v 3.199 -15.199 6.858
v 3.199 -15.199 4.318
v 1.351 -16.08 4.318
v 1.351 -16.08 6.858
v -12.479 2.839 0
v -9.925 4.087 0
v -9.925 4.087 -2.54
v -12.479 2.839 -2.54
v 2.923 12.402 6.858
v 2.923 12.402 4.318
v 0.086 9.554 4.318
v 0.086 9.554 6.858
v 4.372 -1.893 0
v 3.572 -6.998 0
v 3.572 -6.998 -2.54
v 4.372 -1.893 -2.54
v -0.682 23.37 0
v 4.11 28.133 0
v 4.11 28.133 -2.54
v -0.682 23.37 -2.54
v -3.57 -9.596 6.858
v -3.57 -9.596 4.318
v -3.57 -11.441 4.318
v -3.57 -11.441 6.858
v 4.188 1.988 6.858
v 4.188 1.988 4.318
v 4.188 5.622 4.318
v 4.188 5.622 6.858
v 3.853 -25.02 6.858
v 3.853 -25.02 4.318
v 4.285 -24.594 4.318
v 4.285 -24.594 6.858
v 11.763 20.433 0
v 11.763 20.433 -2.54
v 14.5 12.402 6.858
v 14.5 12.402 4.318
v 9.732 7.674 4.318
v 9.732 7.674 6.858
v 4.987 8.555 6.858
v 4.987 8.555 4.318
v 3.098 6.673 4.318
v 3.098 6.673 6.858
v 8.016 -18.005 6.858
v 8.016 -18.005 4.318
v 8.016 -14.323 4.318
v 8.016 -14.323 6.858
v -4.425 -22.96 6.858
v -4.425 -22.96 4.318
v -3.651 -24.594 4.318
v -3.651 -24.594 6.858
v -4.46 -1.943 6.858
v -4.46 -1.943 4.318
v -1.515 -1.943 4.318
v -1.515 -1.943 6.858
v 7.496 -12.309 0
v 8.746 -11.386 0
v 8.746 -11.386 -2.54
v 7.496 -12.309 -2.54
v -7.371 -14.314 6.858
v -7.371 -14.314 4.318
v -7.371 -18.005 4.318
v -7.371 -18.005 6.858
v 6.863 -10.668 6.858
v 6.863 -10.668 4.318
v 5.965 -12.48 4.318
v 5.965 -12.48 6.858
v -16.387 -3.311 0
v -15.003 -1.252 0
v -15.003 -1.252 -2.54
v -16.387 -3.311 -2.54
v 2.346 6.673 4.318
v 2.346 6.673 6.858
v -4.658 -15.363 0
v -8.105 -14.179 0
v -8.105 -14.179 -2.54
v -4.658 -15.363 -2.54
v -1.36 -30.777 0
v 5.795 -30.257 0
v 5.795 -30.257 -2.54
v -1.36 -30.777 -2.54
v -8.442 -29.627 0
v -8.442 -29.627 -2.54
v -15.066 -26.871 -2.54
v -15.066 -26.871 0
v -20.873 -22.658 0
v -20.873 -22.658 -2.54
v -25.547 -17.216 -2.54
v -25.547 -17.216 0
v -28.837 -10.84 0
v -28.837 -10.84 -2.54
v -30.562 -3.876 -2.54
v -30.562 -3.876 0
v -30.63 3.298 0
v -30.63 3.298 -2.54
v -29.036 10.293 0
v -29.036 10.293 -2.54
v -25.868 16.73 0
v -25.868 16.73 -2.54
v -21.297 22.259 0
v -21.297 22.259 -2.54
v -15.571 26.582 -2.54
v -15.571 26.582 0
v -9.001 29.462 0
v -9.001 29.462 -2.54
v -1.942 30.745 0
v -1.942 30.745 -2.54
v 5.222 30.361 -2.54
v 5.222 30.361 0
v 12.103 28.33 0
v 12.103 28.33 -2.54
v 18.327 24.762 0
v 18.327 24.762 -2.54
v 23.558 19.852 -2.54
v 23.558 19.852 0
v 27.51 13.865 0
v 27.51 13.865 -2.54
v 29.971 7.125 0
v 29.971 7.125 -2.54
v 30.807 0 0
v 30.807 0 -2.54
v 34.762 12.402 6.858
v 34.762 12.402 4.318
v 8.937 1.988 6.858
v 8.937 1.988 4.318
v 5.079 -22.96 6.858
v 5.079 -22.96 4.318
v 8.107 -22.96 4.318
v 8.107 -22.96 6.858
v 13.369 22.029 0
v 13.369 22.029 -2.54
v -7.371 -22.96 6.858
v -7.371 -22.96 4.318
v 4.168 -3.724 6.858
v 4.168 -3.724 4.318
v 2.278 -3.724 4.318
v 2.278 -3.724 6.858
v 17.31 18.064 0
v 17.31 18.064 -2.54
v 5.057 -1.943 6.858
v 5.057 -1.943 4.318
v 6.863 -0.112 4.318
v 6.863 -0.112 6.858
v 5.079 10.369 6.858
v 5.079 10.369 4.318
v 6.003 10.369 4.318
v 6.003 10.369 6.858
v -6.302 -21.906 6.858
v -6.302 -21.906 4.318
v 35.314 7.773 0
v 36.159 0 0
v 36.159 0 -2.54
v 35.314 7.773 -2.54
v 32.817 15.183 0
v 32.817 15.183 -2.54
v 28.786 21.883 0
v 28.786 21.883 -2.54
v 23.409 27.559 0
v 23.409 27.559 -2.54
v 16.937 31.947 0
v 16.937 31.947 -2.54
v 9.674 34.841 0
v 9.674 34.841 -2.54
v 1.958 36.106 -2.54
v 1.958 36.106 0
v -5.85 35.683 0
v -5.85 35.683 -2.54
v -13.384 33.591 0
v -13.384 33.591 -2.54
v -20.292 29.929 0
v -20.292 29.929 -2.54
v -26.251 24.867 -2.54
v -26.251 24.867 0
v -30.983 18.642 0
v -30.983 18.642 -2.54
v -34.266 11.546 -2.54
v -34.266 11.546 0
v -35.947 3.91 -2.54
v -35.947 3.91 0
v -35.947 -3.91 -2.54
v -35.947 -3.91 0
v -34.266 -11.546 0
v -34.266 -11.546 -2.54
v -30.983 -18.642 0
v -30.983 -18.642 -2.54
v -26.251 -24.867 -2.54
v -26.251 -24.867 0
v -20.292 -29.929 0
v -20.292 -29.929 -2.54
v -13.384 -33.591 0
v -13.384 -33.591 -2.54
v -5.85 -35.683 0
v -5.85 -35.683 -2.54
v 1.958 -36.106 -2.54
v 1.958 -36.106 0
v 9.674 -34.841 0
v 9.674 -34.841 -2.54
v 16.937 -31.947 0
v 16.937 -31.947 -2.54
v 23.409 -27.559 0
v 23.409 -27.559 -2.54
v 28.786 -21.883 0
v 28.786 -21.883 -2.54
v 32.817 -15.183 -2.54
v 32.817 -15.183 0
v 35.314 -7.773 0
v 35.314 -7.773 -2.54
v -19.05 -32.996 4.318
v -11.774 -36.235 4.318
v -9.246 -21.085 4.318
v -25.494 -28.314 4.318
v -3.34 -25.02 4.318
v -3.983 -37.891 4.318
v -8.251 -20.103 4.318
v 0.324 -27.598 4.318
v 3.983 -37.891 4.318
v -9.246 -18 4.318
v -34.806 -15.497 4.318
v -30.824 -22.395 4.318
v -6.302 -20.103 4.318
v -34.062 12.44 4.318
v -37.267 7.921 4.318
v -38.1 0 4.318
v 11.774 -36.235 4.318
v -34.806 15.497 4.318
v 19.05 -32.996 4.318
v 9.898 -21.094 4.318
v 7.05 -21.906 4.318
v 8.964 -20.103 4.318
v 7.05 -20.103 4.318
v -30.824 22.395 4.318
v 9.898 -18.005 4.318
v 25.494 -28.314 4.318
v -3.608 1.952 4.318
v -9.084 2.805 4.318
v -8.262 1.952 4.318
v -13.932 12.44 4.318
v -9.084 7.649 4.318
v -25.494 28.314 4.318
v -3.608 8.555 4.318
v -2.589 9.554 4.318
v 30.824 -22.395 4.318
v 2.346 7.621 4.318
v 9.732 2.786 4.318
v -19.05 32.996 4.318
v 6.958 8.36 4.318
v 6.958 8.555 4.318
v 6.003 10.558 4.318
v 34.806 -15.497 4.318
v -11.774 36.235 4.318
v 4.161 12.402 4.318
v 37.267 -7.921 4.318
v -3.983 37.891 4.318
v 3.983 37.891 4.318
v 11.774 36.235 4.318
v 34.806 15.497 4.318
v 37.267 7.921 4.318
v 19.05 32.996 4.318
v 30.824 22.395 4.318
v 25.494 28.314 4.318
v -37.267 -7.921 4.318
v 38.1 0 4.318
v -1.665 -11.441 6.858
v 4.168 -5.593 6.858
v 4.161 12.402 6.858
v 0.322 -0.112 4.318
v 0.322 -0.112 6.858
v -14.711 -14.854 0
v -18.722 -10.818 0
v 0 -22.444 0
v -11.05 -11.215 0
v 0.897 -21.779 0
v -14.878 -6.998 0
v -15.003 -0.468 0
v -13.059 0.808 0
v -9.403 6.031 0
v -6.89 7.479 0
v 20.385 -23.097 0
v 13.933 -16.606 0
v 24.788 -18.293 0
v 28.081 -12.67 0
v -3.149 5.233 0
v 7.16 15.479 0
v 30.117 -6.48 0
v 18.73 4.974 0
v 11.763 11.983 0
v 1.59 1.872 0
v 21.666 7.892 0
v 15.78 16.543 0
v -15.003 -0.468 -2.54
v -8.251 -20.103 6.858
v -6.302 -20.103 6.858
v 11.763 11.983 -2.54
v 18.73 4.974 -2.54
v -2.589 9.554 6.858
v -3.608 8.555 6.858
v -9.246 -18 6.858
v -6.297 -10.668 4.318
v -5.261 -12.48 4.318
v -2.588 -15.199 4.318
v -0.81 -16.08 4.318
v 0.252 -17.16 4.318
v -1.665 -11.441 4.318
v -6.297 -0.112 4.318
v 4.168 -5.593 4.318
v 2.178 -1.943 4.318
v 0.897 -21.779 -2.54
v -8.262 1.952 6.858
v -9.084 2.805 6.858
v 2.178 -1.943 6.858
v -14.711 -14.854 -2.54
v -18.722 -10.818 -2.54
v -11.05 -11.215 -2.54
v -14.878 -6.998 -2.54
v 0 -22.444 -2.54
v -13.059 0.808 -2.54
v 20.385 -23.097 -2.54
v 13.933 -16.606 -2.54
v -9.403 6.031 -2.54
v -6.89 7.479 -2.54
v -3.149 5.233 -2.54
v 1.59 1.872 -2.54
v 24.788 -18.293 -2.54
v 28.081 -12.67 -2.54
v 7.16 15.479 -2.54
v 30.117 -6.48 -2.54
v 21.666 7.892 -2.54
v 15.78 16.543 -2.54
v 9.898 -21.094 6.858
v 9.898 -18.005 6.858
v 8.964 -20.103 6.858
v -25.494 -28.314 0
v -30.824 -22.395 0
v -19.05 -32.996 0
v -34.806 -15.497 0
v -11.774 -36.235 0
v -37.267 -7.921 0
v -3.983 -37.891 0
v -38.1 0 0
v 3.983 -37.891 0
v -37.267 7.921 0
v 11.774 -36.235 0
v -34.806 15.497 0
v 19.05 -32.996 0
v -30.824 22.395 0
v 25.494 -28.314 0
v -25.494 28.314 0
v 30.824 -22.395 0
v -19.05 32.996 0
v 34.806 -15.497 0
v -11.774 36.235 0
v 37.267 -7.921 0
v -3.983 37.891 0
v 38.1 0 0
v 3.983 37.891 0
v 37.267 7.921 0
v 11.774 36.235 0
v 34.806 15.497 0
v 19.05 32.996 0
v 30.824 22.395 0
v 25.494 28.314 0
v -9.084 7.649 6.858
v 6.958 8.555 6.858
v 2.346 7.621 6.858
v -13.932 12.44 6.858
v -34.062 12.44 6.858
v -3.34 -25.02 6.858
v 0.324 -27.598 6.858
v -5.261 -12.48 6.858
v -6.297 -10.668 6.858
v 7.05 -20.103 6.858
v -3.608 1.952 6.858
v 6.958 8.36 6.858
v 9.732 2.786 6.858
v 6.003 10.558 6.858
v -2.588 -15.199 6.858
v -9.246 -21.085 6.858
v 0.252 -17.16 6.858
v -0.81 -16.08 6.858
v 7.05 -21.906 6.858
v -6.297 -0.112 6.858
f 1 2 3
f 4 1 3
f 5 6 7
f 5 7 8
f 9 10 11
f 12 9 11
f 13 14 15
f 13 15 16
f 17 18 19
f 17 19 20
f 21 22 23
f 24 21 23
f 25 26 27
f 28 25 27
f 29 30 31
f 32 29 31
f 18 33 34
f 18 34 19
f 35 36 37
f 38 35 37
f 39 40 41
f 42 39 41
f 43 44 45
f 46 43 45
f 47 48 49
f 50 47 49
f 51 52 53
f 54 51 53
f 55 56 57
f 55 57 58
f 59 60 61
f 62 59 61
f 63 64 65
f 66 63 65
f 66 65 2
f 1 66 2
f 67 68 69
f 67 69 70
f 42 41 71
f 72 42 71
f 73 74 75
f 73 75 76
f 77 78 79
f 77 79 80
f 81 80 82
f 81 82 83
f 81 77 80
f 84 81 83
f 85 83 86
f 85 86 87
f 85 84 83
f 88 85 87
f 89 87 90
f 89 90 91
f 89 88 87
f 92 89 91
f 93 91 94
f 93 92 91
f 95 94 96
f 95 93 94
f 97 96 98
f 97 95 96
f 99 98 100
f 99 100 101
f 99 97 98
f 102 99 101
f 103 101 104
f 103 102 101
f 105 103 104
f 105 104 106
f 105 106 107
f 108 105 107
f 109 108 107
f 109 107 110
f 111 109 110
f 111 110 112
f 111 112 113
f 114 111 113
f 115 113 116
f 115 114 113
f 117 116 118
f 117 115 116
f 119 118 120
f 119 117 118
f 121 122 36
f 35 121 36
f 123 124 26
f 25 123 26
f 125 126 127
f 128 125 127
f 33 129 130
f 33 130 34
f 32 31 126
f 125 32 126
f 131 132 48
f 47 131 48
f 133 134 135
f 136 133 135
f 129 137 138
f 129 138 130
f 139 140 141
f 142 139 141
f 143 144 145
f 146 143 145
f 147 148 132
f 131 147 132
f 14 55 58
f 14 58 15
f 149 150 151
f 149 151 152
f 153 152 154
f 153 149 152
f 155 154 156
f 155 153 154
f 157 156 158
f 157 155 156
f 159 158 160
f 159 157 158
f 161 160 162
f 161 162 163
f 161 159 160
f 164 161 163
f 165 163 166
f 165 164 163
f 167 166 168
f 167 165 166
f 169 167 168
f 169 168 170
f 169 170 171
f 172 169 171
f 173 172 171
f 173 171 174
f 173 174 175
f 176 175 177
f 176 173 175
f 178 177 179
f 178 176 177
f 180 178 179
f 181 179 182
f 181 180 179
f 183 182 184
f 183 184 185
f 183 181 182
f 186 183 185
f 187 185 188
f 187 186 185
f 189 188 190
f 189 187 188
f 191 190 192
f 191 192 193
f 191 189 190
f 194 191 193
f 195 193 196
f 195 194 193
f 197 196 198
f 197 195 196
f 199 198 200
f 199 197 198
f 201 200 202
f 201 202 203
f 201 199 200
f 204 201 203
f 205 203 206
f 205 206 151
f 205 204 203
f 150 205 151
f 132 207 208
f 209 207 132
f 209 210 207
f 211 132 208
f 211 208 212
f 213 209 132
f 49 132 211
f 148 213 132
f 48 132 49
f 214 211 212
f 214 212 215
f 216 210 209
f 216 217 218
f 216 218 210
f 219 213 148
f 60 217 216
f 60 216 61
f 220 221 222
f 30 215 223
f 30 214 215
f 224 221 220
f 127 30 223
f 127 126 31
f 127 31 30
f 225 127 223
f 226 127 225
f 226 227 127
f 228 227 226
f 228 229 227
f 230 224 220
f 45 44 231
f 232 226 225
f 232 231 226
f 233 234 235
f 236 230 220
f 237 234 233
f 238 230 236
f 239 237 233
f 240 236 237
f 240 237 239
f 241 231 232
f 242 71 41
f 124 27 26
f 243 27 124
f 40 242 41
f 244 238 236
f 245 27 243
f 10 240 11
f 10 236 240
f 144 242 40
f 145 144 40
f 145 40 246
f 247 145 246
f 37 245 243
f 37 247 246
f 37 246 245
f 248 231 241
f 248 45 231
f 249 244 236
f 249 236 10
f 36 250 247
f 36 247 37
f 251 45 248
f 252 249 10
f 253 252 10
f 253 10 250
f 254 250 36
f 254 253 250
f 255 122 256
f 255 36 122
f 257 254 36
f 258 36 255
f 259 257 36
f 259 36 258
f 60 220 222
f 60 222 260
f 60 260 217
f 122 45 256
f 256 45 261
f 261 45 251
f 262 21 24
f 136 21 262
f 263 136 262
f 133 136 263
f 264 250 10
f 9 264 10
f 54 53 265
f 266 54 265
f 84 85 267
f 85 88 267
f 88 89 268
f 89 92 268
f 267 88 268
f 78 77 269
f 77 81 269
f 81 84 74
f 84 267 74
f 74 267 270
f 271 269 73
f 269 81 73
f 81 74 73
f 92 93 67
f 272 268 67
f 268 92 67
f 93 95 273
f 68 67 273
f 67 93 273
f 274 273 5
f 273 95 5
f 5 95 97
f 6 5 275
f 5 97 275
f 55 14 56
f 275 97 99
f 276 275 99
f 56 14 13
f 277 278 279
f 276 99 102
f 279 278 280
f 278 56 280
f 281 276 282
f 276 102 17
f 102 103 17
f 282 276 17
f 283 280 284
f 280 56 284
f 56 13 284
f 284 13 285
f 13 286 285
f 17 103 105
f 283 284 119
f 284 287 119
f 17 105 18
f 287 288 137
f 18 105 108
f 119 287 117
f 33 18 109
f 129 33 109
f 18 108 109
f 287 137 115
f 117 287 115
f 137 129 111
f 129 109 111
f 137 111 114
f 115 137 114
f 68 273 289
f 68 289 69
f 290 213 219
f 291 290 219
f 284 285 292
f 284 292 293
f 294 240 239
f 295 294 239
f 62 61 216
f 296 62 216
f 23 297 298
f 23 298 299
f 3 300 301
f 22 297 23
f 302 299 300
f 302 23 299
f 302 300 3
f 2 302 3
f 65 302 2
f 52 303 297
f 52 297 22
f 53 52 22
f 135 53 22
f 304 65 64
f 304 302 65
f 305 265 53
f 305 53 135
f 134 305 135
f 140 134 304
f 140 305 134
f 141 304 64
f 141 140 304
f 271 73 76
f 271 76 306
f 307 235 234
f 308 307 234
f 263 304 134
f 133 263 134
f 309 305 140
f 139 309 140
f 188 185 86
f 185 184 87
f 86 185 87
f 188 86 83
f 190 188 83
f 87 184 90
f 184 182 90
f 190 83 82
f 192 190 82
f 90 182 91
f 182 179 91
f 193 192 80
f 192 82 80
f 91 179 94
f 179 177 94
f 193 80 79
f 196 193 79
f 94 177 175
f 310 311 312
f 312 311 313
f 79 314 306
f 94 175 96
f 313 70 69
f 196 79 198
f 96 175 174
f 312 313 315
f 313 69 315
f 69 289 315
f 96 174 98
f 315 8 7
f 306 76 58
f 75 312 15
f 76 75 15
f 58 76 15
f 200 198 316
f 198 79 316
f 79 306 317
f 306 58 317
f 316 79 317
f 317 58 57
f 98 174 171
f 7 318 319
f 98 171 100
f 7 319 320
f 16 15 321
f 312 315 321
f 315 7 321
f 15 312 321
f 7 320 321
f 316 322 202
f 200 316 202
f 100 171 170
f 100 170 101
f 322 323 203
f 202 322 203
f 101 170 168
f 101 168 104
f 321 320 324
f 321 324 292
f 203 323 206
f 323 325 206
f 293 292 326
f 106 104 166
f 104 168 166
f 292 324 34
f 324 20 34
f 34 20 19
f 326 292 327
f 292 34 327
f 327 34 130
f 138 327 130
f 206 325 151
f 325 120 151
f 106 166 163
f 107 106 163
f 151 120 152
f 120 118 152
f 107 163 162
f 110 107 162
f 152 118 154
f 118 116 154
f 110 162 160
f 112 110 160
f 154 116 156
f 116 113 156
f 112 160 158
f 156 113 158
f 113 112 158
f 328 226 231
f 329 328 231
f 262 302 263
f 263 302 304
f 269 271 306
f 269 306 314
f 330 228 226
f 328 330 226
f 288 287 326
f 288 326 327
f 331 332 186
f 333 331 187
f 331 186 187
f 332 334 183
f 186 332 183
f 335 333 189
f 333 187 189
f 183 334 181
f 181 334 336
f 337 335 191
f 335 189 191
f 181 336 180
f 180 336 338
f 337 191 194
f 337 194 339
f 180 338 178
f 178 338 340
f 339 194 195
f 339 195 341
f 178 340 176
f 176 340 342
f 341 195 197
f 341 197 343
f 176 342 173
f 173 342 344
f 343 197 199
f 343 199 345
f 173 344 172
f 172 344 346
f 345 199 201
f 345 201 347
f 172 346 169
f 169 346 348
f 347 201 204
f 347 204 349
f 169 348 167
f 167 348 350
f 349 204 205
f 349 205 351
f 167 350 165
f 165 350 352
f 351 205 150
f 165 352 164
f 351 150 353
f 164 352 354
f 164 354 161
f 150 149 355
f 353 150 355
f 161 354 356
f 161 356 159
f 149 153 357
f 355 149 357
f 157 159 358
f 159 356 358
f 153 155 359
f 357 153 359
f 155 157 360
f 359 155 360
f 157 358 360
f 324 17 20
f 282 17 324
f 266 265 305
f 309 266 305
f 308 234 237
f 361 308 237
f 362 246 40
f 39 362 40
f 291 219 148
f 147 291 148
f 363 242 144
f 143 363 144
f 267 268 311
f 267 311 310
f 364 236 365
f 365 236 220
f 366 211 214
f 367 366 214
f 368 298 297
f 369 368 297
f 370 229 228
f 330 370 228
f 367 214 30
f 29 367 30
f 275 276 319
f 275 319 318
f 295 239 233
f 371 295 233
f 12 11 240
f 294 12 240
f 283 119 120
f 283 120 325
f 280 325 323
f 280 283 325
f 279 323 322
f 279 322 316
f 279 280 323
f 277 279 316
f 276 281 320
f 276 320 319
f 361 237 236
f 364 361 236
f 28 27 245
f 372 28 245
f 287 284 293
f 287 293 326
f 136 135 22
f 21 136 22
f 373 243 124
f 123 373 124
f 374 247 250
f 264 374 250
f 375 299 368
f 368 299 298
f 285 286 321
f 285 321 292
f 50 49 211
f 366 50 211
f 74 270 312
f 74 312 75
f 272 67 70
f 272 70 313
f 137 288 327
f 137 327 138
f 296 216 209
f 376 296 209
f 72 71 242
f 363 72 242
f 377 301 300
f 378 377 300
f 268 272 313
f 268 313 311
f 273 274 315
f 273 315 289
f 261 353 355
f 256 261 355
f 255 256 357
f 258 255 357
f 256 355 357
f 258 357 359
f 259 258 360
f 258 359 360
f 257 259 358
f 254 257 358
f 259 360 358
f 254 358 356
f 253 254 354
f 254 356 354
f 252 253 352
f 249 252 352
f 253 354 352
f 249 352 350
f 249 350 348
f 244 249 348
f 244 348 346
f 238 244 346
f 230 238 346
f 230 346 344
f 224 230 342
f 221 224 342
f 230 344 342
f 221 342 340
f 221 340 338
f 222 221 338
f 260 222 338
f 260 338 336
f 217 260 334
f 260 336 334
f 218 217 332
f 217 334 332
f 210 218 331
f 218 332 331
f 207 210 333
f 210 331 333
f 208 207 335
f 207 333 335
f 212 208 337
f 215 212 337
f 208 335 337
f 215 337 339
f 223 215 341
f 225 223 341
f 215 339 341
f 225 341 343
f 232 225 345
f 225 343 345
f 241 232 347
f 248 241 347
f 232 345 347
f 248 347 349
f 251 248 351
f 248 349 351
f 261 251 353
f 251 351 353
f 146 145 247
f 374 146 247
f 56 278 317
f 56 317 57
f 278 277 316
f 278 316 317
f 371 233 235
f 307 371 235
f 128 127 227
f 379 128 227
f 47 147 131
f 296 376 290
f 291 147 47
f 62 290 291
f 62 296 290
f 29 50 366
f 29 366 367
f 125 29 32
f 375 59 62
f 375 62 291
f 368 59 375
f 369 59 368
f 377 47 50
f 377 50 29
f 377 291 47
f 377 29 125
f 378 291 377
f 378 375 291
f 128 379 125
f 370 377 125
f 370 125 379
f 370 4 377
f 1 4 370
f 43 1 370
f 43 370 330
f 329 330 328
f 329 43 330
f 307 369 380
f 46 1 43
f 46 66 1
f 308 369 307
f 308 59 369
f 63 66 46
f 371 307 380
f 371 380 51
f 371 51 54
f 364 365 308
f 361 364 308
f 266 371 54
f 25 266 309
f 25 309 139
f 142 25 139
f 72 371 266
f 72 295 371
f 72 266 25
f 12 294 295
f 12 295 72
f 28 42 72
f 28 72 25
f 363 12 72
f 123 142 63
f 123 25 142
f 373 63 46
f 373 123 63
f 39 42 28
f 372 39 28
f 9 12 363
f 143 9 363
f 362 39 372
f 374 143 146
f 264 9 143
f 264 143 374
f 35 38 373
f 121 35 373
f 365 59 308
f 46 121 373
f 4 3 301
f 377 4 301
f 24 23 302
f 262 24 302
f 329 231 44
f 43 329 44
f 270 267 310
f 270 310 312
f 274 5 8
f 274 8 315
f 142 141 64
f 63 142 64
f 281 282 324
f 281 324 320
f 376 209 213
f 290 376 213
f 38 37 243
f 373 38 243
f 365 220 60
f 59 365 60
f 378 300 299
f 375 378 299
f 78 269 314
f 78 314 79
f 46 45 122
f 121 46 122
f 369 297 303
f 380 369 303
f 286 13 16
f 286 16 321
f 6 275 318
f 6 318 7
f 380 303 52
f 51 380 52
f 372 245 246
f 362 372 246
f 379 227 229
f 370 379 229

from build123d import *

# Parameters (mm, degrees)
F0_R     = 38.1
F1_DEPTH = 4.318
F3_DEPTH = 2.54
F4_R     = 36.159311
F5_DEPTH = 2.54


with BuildPart() as f1:
    # F0 (on Top) → F1 (new body)
    with BuildSketch(Plane.XY):
        Circle(F0_R)
    extrude(amount=F1_DEPTH)

    # F2 (on face) → F3 (join)
    with BuildSketch(Plane.XY.offset(4.318)):
        Polygon((-34.062076, 12.440001), (-7.371115, -14.31433), (-7.371115, -18.005043), (-9.246102, -18.000251), (-9.246102, -21.084584), (-8.250766, -20.103207), (-6.302369, -20.103207), (-6.302369, -21.906156), (-7.371115, -22.959914), (-4.425159, -22.959914), (-3.651459, -24.593657), (-3.340078, -25.019994), (0.323527, -27.597751), (3.852937, -25.019994), (4.285339, -24.593657), (5.079073, -22.959914), (8.107178, -22.959914), (7.050497, -21.906156), (7.050497, -20.103207), (8.963848, -20.103207), (9.898308, -21.094017), (9.898308, -18.005043), (8.015761, -18.005043), (8.015761, -14.323118), (34.762263, 12.40246), (14.500252, 12.40246), (9.73234, 7.673752), (9.73234, 2.785812), (8.937273, 1.987536), (4.18791, 1.987536), (4.18791, 5.622365), (6.957923, 8.360175), (6.957923, 8.555209), (4.987081, 8.555209), (3.098329, 6.672881), (2.346354, 6.672881), (2.346354, 7.621024), (5.079073, 10.368997), (6.00274, 10.368997), (6.00274, 10.558032), (4.160542, 12.40246), (2.923493, 12.40246), (0.086455, 9.55383), (-2.58904, 9.55383), (-3.608238, 8.555209), (-3.608238, 1.95247), (-8.261997, 1.95247), (-9.084493, 2.805168), (-9.084493, 7.649168), (-13.932226, 12.440001), align=None)
        Polygon((-6.296679, -10.668362), (-6.296679, -0.112185), (-4.45952, -1.943368), (-1.514731, -1.943368), (0.321967, -0.112185), (2.1779, -1.943368), (5.056894, -1.943368), (6.863146, -0.112185), (6.863146, -10.668362), (5.965335, -12.48001), (3.199338, -15.198641), (1.351123, -16.080152), (0.252056, -17.160398), (-0.809691, -16.080152), (-2.588448, -15.198641), (-5.260525, -12.48001), align=None, mode=Mode.SUBTRACT)
        Polygon((-1.665403, -11.440925), (4.168083, -5.593271), (4.168083, -3.724239), (2.277503, -3.724239), (-3.569818, -9.596433), (-3.569818, -11.440925), align=None)
    extrude(amount=F3_DEPTH)

    # F4 (on Top) → F5 (join)
    with BuildSketch(Plane.XY):
        Circle(F4_R)
        with BuildLine():
            ThreePointArc((5.794921, -30.256666), (-23.744145, 19.628106), (30.806606, 0))
            ThreePointArc((30.806606, 0), (28.080712, -12.669672), (20.385426, -23.097216))
            ThreePointArc((20.385426, -23.097216), (13.570817, -27.656462), (5.794921, -30.256666))
        make_face(mode=Mode.SUBTRACT)
        with BuildLine():
            Line((0, -22.444444), (5.794921, -30.256666))
            ThreePointArc((5.794921, -30.256666), (13.570817, -27.656462), (20.385426, -23.097216))
            Line((20.385426, -23.097216), (13.933389, -16.605597))
            Line((13.933389, -16.605597), (8.745673, -11.386055))
            Line((8.745673, -11.386055), (7.496308, -12.30919))
            Line((7.496308, -12.30919), (3.57206, -6.998139))
            Line((3.57206, -6.998139), (4.371937, -1.893155))
            Line((4.371937, -1.893155), (1.590109, 1.871753))
            Line((1.590109, 1.871753), (11.763458, 11.98307))
            Line((11.763458, 11.98307), (18.729663, 4.974128))
            Line((18.729663, 4.974128), (21.665659, 7.892222))
            Line((21.665659, 7.892222), (15.77972, 16.543103))
            Line((15.77972, 16.543103), (17.309812, 18.063865))
            Line((17.309812, 18.063865), (13.368929, 22.028926))
            Line((13.368929, 22.028926), (11.763458, 20.433245))
            Line((11.763458, 20.433245), (4.110456, 28.133198))
            Line((4.110456, 28.133198), (-0.682113, 23.369851))
            Line((-0.682113, 23.369851), (7.16014, 15.479486))
            Line((7.16014, 15.479486), (-3.149464, 5.232744))
            Line((-3.149464, 5.232744), (-6.889652, 7.478646))
            Line((-6.889652, 7.478646), (-9.403128, 6.031075))
            Line((-9.403128, 6.031075), (-9.92541, 4.087029))
            Line((-9.92541, 4.087029), (-12.478785, 2.839357))
            Line((-12.478785, 2.839357), (-13.059097, 0.808264))
            Line((-13.059097, 0.808264), (-15.003144, -0.468424))
            Line((-15.003144, -0.468424), (-15.003144, -1.251846))
            Line((-15.003144, -1.251846), (-16.387494, -3.31088))
            Line((-16.387494, -3.31088), (-14.87847, -6.998139))
            Line((-14.87847, -6.998139), (-18.722013, -10.818246))
            Line((-18.722013, -10.818246), (-14.710922, -14.853945))
            Line((-14.710922, -14.853945), (-11.050018, -11.215364))
            Line((-11.050018, -11.215364), (-8.104812, -14.178638))
            Line((-8.104812, -14.178638), (-4.658059, -15.363094))
            Line((-4.658059, -15.363094), (0.897256, -21.77888))
            Line((0.897256, -21.77888), (0, -22.444444))
        make_face()
    extrude(amount=-F5_DEPTH)


solid = f1.part
